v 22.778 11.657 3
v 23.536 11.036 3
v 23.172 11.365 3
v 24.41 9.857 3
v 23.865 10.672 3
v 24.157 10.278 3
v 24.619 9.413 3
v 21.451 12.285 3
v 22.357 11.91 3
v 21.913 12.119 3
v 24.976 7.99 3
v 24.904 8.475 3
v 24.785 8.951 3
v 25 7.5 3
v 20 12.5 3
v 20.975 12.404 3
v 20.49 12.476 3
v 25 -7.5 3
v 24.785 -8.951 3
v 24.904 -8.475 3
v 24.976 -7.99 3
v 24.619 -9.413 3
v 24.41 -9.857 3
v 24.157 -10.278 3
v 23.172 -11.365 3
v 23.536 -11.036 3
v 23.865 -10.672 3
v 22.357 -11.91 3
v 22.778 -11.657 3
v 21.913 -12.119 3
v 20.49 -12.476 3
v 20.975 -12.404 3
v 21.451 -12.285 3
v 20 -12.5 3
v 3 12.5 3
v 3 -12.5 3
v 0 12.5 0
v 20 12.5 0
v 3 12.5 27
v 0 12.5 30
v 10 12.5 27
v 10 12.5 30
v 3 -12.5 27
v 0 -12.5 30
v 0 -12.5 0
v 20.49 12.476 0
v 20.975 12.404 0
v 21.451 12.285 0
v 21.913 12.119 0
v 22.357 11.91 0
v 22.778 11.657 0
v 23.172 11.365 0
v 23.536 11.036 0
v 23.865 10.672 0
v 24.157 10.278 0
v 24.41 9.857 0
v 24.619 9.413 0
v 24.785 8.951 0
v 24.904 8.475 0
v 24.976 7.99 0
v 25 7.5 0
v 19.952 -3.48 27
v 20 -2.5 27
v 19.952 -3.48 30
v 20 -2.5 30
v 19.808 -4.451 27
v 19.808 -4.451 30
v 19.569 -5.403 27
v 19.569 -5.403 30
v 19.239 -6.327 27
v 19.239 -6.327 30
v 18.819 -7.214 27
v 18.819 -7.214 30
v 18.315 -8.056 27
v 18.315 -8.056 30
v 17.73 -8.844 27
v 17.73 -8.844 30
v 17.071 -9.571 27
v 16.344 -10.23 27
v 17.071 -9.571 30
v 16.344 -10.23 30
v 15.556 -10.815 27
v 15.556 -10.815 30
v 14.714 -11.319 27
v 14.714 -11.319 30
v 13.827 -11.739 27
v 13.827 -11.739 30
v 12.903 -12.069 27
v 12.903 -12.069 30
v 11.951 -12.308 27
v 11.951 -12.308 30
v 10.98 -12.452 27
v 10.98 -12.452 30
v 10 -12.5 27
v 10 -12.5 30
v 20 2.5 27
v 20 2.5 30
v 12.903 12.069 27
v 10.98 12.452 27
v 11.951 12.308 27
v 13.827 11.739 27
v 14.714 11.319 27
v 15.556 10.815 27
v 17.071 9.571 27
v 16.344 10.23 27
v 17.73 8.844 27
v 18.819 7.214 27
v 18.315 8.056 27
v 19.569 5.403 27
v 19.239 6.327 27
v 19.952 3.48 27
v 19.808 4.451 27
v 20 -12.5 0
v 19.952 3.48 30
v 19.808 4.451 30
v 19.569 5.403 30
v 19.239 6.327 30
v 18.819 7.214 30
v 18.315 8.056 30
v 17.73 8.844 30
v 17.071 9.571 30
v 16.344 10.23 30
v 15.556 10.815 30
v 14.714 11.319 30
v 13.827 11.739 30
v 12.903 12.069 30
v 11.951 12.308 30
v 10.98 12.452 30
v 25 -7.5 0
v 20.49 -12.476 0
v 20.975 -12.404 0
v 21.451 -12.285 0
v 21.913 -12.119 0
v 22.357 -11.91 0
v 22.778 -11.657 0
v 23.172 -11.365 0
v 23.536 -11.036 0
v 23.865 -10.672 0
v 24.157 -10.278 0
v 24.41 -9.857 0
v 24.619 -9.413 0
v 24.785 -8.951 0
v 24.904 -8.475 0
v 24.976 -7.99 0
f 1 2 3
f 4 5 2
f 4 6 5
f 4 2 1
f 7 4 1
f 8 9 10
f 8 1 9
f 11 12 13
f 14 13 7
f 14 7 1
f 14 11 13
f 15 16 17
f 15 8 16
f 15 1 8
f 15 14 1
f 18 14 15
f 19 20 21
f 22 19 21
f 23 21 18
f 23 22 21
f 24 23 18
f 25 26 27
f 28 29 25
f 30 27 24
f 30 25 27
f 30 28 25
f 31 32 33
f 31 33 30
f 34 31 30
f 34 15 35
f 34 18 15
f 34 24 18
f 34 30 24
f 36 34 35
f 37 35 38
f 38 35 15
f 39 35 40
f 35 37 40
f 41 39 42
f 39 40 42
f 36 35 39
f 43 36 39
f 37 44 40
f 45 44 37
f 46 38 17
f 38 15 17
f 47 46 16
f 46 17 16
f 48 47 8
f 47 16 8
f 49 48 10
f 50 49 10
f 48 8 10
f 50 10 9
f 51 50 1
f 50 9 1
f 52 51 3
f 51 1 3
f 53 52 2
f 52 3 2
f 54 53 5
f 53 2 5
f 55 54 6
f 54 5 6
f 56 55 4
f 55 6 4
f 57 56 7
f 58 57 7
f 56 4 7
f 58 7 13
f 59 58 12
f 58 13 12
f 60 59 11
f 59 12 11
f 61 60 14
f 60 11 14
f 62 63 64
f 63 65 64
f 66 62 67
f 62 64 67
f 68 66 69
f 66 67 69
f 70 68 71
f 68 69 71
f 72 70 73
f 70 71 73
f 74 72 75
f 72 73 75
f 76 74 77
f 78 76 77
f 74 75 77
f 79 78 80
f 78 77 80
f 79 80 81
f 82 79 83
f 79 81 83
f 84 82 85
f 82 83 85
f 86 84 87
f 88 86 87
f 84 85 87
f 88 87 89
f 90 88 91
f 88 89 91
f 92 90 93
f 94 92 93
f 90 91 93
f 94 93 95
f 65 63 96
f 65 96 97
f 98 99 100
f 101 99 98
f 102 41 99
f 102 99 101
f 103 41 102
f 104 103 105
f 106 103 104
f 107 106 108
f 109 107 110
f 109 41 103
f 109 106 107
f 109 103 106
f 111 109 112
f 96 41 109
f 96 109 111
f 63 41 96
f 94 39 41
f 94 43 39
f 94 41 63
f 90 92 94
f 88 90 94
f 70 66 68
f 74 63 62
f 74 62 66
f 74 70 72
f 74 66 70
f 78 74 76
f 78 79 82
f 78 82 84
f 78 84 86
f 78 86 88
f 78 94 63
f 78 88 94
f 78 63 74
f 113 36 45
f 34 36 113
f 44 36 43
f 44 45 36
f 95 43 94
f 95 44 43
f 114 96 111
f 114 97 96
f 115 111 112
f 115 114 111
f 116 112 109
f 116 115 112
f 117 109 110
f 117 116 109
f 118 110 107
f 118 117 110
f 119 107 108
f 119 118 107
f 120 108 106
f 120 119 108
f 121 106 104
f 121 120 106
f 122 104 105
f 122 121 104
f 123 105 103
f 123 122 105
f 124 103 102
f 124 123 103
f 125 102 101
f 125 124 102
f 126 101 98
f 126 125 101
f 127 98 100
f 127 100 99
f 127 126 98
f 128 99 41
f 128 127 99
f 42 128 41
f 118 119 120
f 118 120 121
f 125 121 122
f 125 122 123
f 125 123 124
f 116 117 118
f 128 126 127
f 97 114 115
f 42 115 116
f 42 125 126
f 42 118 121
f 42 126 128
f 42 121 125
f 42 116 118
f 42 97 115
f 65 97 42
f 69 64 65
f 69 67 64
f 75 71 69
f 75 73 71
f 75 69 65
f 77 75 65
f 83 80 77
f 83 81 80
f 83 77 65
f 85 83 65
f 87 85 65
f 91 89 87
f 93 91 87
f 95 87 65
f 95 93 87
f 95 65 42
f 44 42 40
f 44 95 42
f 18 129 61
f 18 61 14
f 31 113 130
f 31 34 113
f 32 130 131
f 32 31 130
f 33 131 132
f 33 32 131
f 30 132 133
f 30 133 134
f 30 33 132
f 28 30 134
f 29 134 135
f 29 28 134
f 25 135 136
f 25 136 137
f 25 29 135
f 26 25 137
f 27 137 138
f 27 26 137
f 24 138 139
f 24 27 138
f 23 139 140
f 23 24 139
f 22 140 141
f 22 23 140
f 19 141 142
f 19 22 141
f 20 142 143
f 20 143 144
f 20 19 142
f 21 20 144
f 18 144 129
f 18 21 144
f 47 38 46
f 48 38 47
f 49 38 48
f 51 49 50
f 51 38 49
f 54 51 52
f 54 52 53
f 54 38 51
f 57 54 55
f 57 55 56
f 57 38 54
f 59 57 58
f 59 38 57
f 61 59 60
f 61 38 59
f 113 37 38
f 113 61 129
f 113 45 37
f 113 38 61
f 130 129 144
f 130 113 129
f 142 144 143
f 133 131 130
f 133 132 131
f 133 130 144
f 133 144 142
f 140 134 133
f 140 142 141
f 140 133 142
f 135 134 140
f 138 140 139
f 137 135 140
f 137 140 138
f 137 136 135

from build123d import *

# Parameters (mm, degrees)
F0_W     = 3
F0_H     = 3
F0_W_2   = 22
F0_H_2   = 24
F0_W_3   = 17
F1_DEPTH = 12.5
F2_R     = 10
F3_R     = 5


with BuildPart() as f1:
    # F0 (on Front) → F1 (new body, symmetric)
    with BuildSketch(Plane.XZ):
        with Locations((1.5, 1.5)):
            Rectangle(F0_W, F0_H)
        with Locations((14, 1.5)):
            Rectangle(F0_W_2, F0_H)
        with Locations((1.5, 15)):
            Rectangle(F0_W, F0_H_2)
        with Locations((1.5, 28.5)):
            Rectangle(F0_W, F0_H)
        with Locations((11.5, 28.5)):
            Rectangle(F0_W_3, F0_H)
    extrude(amount=F1_DEPTH, both=True)

    # F2
    f2_edges = [f1.edges().sort_by_distance(p)[0] for p in [
        (20, -12.5, 28.5),
        (20, 12.5, 28.5),
    ]]
    fillet(f2_edges, radius=F2_R)

    # F3
    f3_edges = [f1.edges().sort_by_distance(p)[0] for p in [
        (25, -12.5, 1.5),
        (25, 12.5, 1.5),
    ]]
    fillet(f3_edges, radius=F3_R)


solid = f1.part
